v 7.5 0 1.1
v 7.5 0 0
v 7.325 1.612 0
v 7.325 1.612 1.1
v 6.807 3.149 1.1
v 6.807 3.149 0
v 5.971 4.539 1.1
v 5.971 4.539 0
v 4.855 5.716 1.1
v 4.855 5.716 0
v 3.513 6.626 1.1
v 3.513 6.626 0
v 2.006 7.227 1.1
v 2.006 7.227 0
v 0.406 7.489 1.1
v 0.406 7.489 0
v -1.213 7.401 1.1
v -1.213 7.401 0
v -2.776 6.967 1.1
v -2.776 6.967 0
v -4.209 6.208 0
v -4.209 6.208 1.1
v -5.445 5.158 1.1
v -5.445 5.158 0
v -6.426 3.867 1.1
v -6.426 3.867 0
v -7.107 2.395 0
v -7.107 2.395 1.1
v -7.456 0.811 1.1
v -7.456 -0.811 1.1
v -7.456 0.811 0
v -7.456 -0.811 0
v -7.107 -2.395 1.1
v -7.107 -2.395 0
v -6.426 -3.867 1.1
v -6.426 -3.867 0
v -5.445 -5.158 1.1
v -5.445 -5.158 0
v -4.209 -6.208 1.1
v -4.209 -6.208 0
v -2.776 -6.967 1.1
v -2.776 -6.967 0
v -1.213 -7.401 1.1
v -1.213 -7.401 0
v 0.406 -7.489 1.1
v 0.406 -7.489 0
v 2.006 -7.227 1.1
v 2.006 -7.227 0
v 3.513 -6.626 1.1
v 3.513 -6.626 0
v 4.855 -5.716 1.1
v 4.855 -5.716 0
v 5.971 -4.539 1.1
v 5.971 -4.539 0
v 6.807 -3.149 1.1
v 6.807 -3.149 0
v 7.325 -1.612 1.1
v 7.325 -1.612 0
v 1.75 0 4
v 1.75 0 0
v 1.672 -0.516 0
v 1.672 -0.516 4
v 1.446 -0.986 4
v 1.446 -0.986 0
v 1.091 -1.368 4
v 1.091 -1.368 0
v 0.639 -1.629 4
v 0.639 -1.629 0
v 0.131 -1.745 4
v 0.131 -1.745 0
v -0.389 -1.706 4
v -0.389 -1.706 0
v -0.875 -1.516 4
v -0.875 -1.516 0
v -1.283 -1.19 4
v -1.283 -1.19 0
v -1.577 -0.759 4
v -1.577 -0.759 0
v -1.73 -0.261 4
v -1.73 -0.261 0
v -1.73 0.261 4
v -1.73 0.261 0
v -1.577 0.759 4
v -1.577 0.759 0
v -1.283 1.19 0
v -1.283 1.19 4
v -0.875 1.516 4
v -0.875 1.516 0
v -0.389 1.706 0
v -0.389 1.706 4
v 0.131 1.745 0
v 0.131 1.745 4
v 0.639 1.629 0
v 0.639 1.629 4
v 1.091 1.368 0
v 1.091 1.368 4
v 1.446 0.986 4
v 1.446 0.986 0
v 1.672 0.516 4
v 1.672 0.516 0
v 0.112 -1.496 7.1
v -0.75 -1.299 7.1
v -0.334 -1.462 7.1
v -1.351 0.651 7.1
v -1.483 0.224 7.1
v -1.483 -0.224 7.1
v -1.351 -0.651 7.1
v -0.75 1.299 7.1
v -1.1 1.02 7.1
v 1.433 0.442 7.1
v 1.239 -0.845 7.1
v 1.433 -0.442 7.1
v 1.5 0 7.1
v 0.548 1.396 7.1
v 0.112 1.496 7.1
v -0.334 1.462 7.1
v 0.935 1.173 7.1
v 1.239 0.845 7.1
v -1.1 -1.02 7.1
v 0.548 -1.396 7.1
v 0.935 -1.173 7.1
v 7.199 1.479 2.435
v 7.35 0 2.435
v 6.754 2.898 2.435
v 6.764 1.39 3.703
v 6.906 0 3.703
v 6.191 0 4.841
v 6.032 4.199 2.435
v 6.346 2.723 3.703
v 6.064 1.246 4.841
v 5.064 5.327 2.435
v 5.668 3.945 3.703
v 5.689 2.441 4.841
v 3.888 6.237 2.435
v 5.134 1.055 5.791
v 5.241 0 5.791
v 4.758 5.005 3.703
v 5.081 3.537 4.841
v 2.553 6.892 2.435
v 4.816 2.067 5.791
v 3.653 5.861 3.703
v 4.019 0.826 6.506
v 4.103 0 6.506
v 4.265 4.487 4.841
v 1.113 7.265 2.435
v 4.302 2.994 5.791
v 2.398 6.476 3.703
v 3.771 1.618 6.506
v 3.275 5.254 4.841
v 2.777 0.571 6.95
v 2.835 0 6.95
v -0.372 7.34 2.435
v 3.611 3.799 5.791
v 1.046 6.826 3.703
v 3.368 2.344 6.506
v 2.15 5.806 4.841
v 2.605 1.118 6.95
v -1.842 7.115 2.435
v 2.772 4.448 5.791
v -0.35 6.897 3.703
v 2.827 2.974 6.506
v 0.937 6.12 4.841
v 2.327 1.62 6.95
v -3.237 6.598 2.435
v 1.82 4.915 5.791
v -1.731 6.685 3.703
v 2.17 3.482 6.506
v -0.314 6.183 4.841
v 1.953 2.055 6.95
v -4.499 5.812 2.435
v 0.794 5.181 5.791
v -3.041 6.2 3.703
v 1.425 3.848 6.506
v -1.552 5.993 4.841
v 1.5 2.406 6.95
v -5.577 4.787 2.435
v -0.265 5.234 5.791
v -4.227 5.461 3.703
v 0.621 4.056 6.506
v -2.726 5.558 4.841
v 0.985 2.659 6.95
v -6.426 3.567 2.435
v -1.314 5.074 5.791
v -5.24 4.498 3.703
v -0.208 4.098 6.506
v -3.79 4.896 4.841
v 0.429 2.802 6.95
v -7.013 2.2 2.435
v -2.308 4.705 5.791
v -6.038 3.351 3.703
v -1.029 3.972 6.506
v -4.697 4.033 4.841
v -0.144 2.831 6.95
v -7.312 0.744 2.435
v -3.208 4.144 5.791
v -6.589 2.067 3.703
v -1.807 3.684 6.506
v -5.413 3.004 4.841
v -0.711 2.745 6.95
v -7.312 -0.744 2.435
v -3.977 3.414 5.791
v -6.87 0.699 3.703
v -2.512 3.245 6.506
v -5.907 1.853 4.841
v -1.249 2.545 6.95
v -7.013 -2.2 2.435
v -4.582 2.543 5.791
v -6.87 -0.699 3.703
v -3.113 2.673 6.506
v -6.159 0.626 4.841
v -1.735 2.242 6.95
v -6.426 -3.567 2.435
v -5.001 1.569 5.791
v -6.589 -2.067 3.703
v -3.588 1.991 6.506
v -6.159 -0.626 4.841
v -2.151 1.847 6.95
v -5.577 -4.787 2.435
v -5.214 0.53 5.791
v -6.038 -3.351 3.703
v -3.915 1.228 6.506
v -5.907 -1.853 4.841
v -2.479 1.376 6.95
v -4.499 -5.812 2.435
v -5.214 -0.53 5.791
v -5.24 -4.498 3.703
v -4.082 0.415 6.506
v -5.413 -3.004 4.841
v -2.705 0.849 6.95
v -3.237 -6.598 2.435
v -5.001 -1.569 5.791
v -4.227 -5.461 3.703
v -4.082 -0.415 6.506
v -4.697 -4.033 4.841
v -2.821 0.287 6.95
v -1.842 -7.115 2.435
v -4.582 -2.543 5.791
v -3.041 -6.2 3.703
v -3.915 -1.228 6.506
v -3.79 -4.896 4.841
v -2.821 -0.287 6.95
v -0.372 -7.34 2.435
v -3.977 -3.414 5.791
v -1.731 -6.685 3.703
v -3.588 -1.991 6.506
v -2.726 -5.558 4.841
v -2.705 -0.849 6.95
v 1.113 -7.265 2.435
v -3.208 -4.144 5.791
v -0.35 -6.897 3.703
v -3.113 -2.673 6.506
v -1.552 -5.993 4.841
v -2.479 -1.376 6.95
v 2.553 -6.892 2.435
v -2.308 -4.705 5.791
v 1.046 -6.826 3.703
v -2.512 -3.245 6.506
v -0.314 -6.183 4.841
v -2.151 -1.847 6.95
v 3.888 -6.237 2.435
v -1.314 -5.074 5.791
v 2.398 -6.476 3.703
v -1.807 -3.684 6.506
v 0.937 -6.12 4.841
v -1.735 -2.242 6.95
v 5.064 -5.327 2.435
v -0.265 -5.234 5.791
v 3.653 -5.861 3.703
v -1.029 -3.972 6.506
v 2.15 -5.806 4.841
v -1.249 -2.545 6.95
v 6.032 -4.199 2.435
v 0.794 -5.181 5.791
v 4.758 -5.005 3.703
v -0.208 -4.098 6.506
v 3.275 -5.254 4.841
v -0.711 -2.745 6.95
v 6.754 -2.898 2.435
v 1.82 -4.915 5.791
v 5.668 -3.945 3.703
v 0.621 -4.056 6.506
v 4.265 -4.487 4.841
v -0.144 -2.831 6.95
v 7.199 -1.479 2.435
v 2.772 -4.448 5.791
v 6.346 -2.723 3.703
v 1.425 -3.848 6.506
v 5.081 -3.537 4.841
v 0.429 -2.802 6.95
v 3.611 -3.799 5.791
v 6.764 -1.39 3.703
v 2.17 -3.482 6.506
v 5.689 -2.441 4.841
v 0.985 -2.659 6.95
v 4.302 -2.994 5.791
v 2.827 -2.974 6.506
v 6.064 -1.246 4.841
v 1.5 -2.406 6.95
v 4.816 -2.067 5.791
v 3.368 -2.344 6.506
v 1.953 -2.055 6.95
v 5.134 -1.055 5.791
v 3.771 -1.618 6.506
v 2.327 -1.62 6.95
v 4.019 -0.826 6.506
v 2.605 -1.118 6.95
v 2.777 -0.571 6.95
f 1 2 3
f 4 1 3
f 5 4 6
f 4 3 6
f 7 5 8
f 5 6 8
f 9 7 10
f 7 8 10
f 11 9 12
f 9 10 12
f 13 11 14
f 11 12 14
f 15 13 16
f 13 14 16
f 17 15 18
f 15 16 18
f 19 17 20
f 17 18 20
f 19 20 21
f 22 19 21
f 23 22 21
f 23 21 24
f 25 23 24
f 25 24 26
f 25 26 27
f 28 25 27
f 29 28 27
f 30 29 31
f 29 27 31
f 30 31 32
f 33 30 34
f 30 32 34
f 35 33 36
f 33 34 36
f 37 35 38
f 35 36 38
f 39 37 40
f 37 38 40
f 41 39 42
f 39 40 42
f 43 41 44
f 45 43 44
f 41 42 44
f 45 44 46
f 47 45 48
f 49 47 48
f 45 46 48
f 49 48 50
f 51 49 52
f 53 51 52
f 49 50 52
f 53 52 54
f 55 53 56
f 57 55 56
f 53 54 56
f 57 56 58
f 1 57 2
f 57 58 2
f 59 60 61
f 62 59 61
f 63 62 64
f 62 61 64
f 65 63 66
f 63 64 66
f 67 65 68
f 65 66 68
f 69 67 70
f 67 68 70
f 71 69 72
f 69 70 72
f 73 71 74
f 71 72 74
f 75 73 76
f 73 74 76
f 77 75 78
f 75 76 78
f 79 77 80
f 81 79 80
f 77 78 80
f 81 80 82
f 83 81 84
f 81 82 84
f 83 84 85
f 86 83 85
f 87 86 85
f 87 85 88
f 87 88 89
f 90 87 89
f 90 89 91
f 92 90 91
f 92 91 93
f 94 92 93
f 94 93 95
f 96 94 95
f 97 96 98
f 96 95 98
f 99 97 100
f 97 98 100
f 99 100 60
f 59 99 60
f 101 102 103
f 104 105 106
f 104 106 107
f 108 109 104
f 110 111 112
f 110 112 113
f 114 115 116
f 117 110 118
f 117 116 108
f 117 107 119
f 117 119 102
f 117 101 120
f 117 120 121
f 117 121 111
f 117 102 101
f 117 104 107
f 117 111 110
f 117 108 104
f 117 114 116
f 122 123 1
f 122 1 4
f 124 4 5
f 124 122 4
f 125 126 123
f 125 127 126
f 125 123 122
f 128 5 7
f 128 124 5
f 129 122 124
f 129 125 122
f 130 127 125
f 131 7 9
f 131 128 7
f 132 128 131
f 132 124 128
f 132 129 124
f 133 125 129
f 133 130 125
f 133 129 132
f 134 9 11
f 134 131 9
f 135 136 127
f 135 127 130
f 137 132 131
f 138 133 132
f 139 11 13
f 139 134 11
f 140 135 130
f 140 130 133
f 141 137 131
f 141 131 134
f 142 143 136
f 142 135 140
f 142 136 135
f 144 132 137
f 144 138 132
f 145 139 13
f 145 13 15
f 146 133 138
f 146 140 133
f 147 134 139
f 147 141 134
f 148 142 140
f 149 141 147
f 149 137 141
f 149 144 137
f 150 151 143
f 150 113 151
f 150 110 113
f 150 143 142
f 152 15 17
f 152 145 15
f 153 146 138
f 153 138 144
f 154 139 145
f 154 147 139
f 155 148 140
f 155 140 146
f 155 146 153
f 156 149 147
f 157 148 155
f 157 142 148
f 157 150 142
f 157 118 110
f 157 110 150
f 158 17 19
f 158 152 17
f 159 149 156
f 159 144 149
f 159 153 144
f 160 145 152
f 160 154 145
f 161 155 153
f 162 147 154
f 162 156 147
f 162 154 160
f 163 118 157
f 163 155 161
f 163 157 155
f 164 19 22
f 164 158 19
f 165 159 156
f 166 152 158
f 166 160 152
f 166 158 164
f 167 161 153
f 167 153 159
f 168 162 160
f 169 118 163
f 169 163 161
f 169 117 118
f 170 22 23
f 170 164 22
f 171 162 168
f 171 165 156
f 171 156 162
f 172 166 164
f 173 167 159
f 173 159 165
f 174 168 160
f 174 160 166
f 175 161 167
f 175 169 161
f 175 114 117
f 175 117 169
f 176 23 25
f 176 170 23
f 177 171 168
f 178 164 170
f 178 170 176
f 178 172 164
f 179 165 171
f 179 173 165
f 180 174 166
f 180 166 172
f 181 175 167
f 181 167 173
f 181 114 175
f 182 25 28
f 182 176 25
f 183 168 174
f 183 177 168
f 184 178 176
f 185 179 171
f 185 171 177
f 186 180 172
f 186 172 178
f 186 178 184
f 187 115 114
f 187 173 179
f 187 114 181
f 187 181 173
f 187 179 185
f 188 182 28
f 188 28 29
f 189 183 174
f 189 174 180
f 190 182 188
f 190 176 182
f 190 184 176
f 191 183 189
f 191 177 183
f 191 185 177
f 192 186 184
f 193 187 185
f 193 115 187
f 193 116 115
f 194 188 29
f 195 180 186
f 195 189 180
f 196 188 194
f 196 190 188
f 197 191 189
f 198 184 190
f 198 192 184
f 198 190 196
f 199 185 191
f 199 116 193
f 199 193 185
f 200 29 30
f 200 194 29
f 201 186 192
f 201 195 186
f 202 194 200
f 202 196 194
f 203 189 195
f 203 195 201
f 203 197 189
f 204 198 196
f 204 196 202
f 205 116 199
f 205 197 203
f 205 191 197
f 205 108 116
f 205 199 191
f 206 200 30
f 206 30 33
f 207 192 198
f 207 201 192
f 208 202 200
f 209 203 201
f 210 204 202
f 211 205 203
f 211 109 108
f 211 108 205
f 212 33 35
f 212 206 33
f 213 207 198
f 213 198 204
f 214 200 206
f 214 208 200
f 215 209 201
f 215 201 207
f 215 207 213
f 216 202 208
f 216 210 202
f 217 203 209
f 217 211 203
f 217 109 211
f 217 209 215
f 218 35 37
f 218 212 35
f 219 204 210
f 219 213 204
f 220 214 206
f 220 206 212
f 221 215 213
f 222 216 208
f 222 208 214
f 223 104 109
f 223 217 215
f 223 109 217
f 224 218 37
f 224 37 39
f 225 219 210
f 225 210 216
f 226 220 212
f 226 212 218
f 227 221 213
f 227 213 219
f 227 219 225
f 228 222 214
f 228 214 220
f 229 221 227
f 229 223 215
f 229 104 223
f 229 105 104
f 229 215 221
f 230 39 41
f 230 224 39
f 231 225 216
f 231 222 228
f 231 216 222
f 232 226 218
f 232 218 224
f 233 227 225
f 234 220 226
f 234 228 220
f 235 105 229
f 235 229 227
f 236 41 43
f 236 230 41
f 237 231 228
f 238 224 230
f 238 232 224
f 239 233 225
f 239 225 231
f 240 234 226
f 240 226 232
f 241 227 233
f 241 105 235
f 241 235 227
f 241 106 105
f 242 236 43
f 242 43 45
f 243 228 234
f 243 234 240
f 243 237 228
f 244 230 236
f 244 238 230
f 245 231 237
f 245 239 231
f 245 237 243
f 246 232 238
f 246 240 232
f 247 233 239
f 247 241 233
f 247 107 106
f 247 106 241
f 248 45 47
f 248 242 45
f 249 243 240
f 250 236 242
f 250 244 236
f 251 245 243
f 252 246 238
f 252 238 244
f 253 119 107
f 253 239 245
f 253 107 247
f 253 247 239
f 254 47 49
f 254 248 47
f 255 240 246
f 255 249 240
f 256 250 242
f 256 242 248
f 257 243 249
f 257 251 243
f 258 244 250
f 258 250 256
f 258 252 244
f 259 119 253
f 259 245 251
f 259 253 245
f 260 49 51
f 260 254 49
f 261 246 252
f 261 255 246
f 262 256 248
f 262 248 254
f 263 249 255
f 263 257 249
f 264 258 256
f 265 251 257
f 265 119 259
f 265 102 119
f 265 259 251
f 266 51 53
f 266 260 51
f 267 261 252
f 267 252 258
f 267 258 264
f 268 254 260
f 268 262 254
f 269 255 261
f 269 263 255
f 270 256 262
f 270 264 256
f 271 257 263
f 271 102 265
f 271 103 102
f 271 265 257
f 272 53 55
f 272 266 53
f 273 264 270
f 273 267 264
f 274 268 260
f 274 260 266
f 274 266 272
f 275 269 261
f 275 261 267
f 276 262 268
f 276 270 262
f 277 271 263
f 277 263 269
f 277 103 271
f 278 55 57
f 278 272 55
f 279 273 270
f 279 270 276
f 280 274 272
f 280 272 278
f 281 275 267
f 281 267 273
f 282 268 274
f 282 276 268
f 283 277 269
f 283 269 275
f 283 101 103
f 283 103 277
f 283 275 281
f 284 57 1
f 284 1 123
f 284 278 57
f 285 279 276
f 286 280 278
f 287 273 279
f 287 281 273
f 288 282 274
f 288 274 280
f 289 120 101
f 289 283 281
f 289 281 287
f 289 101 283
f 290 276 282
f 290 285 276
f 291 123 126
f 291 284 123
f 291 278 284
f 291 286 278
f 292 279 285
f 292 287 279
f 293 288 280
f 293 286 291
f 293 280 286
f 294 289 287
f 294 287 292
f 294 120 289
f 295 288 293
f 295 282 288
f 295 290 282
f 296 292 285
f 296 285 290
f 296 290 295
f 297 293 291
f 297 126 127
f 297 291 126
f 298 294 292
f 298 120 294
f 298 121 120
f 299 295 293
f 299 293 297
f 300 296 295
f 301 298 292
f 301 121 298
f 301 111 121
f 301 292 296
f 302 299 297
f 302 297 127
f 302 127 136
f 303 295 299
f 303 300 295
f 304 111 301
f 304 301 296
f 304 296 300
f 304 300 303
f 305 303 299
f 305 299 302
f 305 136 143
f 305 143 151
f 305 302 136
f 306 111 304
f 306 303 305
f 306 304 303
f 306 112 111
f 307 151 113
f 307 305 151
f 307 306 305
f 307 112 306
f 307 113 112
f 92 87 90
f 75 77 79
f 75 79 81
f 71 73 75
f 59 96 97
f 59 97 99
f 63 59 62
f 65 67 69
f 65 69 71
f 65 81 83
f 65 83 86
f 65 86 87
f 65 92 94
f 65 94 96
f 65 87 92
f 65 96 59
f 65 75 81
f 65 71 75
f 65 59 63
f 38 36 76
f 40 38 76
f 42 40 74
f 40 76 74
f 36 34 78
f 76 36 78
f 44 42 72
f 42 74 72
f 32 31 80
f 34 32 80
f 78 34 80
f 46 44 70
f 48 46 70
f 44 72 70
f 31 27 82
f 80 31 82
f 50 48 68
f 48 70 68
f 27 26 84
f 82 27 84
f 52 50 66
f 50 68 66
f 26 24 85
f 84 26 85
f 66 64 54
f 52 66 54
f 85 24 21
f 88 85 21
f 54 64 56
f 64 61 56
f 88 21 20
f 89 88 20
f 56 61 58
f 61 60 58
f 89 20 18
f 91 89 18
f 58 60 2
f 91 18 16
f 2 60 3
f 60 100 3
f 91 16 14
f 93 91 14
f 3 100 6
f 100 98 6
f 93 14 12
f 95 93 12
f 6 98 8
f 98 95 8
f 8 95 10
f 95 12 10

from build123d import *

# Parameters (mm, degrees)
F0_R     = 7.5
F1_DEPTH = 7.1
F2_R     = 1.75
F3_DEPTH = 4
F4_R     = 6


with BuildPart() as f1:
    # F0 (on Top) → F1 (new body)
    with BuildSketch(Plane.XY):
        Circle(F0_R)
    extrude(amount=F1_DEPTH)

    # F2 (on face) → F3 (cut)
    with BuildSketch(Plane(origin=(0, 0, 0), x_dir=(1, 0, 0), z_dir=(0, 0, -1))):
        Circle(F2_R)
    extrude(amount=-F3_DEPTH, mode=Mode.SUBTRACT)

    # F4
    f4_edges = [f1.edges().sort_by_distance(p)[0] for p in [
        (-7.5, 0, 7.1),
    ]]
    fillet(f4_edges, radius=F4_R)


solid = f1.part
